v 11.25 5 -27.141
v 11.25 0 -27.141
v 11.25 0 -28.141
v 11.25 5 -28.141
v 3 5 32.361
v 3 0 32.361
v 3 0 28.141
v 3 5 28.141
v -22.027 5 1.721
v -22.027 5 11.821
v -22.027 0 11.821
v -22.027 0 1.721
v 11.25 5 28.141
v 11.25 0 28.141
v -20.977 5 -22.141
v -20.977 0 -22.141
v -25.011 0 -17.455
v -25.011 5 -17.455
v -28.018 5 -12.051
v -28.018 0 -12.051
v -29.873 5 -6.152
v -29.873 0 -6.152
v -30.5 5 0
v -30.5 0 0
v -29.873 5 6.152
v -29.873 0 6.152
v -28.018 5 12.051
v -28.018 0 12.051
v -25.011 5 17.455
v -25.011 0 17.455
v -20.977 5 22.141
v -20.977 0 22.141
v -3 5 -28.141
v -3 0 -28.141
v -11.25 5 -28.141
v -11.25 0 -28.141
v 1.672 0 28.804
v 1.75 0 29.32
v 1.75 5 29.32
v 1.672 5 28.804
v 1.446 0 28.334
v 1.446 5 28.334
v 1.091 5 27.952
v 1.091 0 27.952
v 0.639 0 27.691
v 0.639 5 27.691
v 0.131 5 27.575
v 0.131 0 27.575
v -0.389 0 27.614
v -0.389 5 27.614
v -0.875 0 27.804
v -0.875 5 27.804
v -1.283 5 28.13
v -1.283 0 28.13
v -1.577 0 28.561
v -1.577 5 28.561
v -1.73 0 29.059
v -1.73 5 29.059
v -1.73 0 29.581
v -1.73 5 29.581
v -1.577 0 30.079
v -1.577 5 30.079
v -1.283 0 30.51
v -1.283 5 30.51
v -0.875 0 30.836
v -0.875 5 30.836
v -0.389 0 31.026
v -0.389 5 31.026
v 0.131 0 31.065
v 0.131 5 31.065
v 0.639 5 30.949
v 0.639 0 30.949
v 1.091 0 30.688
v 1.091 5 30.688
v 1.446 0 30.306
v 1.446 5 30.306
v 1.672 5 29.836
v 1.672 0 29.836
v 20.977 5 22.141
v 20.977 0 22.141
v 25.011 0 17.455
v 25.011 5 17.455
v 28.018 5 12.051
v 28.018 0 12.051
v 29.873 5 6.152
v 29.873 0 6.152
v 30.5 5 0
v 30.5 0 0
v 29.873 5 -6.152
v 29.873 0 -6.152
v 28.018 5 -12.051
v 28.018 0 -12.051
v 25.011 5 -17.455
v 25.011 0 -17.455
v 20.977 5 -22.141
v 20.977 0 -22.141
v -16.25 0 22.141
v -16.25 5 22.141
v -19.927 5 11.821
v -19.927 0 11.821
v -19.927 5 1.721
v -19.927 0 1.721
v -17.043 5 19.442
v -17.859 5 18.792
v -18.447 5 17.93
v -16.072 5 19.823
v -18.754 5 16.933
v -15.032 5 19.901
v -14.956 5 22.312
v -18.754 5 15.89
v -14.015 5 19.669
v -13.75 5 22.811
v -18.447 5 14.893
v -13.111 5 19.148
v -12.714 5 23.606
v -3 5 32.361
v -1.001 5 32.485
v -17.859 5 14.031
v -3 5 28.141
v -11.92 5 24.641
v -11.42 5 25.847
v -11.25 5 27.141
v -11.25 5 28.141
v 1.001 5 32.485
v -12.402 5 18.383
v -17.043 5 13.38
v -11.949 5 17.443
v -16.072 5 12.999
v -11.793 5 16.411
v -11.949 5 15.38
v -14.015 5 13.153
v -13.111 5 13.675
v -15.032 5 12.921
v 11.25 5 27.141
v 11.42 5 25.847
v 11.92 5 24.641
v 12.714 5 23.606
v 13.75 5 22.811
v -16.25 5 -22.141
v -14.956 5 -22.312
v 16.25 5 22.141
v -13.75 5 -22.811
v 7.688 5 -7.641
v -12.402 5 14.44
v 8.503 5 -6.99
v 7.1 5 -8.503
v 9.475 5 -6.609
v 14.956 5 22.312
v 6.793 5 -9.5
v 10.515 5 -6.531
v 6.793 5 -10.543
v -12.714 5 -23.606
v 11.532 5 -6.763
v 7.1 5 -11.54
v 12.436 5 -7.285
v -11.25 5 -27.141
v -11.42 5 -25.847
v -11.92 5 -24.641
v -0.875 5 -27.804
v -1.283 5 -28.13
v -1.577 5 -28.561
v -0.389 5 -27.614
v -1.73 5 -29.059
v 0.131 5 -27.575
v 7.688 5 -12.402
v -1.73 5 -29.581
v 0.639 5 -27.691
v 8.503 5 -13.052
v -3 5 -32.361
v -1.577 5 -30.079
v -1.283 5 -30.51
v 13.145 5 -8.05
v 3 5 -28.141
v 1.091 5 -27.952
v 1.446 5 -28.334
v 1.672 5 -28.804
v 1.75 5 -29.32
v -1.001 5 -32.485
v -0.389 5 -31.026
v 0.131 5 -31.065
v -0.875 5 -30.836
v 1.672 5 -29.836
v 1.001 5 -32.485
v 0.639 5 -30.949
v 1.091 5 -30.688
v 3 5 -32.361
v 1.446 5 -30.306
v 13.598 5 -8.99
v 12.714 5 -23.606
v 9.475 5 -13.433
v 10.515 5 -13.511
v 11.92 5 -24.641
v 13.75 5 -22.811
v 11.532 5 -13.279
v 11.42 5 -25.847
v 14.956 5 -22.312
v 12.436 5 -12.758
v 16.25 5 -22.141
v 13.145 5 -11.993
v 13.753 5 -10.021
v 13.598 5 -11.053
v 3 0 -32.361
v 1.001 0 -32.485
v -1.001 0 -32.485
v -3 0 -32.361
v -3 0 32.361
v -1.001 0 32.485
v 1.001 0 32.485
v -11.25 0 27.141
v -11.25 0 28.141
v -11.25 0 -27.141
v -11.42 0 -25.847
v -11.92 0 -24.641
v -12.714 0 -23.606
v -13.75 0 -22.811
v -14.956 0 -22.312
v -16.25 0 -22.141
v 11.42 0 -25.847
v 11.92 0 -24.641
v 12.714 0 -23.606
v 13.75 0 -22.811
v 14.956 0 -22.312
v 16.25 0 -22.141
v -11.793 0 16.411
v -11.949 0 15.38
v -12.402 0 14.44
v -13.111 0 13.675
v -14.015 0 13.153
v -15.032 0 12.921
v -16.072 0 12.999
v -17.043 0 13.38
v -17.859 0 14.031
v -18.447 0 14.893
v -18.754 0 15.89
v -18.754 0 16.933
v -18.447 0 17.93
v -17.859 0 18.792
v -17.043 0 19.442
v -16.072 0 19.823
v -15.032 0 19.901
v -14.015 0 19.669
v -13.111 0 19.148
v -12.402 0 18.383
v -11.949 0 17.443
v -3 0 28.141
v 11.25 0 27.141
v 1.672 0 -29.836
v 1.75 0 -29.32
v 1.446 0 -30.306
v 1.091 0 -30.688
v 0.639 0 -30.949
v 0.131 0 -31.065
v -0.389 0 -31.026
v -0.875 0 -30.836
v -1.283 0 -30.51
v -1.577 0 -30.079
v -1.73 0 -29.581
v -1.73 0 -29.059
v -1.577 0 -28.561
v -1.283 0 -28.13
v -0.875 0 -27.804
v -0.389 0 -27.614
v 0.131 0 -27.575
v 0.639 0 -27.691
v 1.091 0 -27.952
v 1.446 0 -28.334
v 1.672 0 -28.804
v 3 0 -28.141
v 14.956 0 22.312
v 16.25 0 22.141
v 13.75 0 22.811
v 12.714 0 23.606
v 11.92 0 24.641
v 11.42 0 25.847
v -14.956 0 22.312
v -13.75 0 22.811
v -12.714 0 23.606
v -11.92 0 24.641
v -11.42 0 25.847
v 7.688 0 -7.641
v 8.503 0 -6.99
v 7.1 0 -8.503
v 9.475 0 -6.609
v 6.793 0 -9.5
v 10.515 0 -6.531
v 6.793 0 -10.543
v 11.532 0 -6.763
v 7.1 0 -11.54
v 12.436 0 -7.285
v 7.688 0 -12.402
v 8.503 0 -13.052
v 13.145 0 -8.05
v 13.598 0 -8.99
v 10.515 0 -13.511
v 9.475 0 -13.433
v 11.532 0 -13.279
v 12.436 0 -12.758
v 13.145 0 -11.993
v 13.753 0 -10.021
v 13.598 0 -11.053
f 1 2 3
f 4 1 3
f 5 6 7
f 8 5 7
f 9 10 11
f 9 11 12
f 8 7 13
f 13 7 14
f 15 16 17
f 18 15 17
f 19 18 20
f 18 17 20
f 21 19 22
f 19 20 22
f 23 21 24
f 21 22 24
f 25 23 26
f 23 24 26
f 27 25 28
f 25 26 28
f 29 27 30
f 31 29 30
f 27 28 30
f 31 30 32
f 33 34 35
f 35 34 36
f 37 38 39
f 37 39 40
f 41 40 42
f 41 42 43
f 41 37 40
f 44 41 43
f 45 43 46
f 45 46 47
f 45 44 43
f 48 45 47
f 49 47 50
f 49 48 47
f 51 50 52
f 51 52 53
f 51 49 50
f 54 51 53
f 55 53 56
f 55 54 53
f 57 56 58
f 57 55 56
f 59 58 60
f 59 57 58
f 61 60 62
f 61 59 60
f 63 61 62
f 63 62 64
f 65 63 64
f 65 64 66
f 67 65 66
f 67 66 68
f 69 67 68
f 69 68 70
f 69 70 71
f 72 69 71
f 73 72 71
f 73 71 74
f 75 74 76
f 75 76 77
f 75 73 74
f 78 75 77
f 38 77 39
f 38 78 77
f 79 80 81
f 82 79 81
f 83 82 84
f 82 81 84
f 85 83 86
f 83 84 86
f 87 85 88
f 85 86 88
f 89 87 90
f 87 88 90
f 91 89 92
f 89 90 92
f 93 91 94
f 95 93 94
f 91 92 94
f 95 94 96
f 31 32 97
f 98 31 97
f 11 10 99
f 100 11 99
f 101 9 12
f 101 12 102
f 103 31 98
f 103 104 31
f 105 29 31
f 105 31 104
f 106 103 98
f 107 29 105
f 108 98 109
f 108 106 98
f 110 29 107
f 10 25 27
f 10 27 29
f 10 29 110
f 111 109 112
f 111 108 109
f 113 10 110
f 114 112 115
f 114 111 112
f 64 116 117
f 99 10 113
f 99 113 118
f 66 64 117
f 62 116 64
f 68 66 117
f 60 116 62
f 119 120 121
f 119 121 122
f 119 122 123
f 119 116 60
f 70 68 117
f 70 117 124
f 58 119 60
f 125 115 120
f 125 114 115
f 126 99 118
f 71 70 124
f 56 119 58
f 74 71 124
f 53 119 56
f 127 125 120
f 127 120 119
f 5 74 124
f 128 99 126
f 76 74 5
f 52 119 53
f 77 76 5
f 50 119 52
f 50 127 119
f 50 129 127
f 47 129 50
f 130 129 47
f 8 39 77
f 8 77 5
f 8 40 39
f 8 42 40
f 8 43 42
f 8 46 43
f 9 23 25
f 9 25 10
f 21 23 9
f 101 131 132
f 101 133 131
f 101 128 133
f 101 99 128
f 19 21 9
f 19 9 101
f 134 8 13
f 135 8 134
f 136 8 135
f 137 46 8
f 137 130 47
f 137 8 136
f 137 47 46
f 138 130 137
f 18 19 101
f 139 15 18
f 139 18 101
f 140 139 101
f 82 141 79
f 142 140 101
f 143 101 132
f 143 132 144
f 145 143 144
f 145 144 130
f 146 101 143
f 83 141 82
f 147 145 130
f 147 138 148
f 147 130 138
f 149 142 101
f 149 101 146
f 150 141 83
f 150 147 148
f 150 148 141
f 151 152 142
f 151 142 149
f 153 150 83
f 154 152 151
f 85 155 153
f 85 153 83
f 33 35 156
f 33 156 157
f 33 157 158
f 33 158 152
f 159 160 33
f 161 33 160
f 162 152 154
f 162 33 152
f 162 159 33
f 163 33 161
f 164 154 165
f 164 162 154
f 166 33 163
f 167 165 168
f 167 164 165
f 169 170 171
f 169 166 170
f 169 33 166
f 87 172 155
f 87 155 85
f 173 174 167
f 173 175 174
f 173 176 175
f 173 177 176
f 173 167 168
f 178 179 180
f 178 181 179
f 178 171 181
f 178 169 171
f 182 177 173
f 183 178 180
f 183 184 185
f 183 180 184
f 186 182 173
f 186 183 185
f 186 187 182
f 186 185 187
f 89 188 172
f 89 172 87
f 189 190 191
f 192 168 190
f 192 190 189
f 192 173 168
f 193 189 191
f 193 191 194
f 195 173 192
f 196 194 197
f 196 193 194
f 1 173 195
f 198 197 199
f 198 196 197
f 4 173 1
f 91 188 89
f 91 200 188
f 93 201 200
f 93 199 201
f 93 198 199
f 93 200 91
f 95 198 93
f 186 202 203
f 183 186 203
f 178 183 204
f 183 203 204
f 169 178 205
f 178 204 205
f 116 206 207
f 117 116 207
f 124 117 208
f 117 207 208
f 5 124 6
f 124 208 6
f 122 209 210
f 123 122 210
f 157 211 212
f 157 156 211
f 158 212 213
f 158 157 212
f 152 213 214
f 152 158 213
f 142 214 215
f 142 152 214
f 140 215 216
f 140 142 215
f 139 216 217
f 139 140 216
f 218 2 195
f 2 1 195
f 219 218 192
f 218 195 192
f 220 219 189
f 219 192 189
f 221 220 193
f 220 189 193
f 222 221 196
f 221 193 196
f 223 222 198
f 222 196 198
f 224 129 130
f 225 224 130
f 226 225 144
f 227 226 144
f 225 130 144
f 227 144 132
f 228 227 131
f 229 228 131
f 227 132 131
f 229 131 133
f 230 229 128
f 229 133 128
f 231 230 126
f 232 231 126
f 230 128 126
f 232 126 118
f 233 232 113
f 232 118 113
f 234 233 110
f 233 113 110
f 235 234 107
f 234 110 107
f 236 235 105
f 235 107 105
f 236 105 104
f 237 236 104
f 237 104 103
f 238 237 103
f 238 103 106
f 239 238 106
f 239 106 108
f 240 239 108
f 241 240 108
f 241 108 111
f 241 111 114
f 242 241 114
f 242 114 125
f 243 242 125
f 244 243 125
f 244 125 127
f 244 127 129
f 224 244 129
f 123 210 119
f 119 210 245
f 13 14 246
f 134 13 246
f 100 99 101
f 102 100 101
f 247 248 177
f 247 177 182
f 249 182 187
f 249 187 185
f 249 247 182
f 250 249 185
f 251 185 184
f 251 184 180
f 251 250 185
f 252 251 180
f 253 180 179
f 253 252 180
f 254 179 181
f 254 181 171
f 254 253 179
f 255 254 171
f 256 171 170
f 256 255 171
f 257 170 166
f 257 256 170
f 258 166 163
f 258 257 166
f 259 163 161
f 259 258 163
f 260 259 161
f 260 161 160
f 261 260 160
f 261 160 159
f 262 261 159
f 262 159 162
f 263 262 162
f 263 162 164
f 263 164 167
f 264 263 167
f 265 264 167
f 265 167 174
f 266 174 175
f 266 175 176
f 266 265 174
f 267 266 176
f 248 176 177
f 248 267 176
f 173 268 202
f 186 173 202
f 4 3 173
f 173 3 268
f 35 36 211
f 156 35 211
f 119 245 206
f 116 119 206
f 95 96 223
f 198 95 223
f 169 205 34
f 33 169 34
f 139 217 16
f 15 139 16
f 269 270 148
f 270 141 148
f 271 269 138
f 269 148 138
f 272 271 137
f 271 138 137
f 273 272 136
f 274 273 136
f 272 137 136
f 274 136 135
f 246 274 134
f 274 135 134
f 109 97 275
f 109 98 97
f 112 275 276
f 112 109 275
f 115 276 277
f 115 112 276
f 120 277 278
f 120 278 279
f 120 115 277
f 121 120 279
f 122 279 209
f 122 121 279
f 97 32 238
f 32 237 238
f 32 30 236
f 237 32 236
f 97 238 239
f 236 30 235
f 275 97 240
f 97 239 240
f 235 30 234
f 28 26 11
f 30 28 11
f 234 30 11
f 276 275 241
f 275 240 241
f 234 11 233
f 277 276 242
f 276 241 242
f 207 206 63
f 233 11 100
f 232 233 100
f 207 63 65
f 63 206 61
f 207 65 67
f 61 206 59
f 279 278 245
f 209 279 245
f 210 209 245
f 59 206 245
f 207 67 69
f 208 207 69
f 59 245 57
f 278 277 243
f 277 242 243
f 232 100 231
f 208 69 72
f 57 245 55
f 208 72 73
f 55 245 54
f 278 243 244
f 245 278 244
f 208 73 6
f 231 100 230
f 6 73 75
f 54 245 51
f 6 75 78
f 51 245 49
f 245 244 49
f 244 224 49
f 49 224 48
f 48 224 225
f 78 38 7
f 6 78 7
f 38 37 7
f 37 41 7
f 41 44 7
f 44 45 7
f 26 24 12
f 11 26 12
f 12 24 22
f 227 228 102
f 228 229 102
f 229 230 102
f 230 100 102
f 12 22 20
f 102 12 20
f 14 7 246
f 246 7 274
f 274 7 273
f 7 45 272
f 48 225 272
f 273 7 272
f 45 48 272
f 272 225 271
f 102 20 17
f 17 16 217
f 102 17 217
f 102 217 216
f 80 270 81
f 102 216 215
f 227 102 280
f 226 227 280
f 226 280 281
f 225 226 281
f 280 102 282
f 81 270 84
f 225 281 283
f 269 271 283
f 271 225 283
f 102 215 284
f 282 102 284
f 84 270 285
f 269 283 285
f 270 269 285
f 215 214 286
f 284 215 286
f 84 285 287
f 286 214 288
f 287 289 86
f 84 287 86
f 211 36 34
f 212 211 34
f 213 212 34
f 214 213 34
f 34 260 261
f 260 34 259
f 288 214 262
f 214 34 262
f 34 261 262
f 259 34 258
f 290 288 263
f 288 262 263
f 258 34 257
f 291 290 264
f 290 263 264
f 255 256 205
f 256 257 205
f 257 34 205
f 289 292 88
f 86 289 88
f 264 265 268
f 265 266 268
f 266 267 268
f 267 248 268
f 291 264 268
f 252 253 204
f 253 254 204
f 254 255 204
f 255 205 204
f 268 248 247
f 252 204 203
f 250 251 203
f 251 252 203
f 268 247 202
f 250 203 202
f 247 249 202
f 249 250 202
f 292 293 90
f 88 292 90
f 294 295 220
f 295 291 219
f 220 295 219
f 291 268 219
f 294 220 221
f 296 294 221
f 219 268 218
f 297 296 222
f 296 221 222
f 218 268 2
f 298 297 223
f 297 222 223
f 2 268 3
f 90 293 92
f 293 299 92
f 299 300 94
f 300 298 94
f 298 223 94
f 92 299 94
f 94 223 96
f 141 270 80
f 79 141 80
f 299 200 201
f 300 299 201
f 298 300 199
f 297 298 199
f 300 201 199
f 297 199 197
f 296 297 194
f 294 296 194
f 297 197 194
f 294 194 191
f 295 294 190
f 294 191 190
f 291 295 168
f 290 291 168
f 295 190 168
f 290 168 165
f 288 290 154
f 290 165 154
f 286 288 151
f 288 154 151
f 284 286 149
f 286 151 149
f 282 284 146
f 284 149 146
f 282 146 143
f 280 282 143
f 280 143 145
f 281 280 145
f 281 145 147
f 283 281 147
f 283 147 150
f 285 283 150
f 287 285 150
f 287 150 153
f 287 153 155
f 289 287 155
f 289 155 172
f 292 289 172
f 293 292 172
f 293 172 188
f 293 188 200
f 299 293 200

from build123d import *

# Parameters (mm, degrees)
SKETCH2_R           = 1.75
BOSS_EXTRUDE1_DEPTH = 5
FILLET1_R           = 5
SKETCH3_R           = 3.5
SKETCH3_W           = 2.1
SKETCH3_H           = 10.1
CUT_EXTRUDE1_DEPTH  = 6


with BuildPart() as part:
    # Sketch2 → Boss-Extrude1 (new body)
    with BuildSketch(Plane(origin=(0, 0, 0), x_dir=(1, 0, 0), z_dir=(0, 1, 0))):
        with BuildLine():
            Line((3, 28.141242251), (3, 32.361242251))
            ThreePointArc((3, 32.361242251), (0, 32.5), (-3, 32.361242251))
            Line((-3, 32.361242251), (-3, 28.141242251))
            Line((-3, 28.141242251), (-11.25, 28.141242251))
            Line((-11.25, 28.141242251), (-11.25, 22.141242251))
            Line((-11.25, 22.141242251), (-20.976543843, 22.141242251))
            ThreePointArc((-20.976543843, 22.141242251), (-30.5, 0), (-20.976543843, -22.141242251))
            Line((-20.976543843, -22.141242251), (-11.25, -22.141242251))
            Line((-11.25, -22.141242251), (-11.25, -28.141242251))
            Line((-11.25, -28.141242251), (-3, -28.141242251))
            Line((-3, -28.141242251), (-3, -32.361242251))
            ThreePointArc((-3, -32.361242251), (0, -32.5), (3, -32.361242251))
            Line((3, -32.361242251), (3, -28.141242251))
            Line((3, -28.141242251), (11.25, -28.141242251))
            Line((11.25, -28.141242251), (11.25, -22.141242251))
            Line((11.25, -22.141242251), (20.976543843, -22.141242251))
            ThreePointArc((20.976543843, -22.141242251), (30.5, 0), (20.976543843, 22.141242251))
            Line((20.976543843, 22.141242251), (11.25, 22.141242251))
            Line((11.25, 22.141242251), (11.25, 28.141242251))
            Line((11.25, 28.141242251), (3, 28.141242251))
        make_face()
        with Locations((0, 29.32)):
            Circle(SKETCH2_R, mode=Mode.SUBTRACT)
        with Locations((0, -29.32)):
            Circle(SKETCH2_R, mode=Mode.SUBTRACT)
    extrude(amount=BOSS_EXTRUDE1_DEPTH)

    # Fillet1
    fillet1_edges = [part.edges().sort_by_distance(p)[0] for p in [
        (-11.25, 2.5, -22.141242251),
        (11.25, 2.5, -22.141242251),
        (11.25, 2.5, 22.141242251),
        (-11.25, 2.5, 22.141242251),
    ]]
    fillet(fillet1_edges, radius=FILLET1_R)

    # Sketch3 → Cut-Extrude1 (cut, through all)
    with BuildSketch(Plane(origin=(0, 5, 0), x_dir=(1, 0, 0), z_dir=(0, 1, 0))):
        with Locations((10.253456157, 10.021242251)):
            Circle(SKETCH3_R)
        with Locations((-15.293456157, -16.411242251)):
            Circle(SKETCH3_R)
        with Locations((-20.976543843, -6.771242251)):
            Rectangle(SKETCH3_W, SKETCH3_H)
    extrude(amount=-CUT_EXTRUDE1_DEPTH, mode=Mode.SUBTRACT)


solid = part.part
